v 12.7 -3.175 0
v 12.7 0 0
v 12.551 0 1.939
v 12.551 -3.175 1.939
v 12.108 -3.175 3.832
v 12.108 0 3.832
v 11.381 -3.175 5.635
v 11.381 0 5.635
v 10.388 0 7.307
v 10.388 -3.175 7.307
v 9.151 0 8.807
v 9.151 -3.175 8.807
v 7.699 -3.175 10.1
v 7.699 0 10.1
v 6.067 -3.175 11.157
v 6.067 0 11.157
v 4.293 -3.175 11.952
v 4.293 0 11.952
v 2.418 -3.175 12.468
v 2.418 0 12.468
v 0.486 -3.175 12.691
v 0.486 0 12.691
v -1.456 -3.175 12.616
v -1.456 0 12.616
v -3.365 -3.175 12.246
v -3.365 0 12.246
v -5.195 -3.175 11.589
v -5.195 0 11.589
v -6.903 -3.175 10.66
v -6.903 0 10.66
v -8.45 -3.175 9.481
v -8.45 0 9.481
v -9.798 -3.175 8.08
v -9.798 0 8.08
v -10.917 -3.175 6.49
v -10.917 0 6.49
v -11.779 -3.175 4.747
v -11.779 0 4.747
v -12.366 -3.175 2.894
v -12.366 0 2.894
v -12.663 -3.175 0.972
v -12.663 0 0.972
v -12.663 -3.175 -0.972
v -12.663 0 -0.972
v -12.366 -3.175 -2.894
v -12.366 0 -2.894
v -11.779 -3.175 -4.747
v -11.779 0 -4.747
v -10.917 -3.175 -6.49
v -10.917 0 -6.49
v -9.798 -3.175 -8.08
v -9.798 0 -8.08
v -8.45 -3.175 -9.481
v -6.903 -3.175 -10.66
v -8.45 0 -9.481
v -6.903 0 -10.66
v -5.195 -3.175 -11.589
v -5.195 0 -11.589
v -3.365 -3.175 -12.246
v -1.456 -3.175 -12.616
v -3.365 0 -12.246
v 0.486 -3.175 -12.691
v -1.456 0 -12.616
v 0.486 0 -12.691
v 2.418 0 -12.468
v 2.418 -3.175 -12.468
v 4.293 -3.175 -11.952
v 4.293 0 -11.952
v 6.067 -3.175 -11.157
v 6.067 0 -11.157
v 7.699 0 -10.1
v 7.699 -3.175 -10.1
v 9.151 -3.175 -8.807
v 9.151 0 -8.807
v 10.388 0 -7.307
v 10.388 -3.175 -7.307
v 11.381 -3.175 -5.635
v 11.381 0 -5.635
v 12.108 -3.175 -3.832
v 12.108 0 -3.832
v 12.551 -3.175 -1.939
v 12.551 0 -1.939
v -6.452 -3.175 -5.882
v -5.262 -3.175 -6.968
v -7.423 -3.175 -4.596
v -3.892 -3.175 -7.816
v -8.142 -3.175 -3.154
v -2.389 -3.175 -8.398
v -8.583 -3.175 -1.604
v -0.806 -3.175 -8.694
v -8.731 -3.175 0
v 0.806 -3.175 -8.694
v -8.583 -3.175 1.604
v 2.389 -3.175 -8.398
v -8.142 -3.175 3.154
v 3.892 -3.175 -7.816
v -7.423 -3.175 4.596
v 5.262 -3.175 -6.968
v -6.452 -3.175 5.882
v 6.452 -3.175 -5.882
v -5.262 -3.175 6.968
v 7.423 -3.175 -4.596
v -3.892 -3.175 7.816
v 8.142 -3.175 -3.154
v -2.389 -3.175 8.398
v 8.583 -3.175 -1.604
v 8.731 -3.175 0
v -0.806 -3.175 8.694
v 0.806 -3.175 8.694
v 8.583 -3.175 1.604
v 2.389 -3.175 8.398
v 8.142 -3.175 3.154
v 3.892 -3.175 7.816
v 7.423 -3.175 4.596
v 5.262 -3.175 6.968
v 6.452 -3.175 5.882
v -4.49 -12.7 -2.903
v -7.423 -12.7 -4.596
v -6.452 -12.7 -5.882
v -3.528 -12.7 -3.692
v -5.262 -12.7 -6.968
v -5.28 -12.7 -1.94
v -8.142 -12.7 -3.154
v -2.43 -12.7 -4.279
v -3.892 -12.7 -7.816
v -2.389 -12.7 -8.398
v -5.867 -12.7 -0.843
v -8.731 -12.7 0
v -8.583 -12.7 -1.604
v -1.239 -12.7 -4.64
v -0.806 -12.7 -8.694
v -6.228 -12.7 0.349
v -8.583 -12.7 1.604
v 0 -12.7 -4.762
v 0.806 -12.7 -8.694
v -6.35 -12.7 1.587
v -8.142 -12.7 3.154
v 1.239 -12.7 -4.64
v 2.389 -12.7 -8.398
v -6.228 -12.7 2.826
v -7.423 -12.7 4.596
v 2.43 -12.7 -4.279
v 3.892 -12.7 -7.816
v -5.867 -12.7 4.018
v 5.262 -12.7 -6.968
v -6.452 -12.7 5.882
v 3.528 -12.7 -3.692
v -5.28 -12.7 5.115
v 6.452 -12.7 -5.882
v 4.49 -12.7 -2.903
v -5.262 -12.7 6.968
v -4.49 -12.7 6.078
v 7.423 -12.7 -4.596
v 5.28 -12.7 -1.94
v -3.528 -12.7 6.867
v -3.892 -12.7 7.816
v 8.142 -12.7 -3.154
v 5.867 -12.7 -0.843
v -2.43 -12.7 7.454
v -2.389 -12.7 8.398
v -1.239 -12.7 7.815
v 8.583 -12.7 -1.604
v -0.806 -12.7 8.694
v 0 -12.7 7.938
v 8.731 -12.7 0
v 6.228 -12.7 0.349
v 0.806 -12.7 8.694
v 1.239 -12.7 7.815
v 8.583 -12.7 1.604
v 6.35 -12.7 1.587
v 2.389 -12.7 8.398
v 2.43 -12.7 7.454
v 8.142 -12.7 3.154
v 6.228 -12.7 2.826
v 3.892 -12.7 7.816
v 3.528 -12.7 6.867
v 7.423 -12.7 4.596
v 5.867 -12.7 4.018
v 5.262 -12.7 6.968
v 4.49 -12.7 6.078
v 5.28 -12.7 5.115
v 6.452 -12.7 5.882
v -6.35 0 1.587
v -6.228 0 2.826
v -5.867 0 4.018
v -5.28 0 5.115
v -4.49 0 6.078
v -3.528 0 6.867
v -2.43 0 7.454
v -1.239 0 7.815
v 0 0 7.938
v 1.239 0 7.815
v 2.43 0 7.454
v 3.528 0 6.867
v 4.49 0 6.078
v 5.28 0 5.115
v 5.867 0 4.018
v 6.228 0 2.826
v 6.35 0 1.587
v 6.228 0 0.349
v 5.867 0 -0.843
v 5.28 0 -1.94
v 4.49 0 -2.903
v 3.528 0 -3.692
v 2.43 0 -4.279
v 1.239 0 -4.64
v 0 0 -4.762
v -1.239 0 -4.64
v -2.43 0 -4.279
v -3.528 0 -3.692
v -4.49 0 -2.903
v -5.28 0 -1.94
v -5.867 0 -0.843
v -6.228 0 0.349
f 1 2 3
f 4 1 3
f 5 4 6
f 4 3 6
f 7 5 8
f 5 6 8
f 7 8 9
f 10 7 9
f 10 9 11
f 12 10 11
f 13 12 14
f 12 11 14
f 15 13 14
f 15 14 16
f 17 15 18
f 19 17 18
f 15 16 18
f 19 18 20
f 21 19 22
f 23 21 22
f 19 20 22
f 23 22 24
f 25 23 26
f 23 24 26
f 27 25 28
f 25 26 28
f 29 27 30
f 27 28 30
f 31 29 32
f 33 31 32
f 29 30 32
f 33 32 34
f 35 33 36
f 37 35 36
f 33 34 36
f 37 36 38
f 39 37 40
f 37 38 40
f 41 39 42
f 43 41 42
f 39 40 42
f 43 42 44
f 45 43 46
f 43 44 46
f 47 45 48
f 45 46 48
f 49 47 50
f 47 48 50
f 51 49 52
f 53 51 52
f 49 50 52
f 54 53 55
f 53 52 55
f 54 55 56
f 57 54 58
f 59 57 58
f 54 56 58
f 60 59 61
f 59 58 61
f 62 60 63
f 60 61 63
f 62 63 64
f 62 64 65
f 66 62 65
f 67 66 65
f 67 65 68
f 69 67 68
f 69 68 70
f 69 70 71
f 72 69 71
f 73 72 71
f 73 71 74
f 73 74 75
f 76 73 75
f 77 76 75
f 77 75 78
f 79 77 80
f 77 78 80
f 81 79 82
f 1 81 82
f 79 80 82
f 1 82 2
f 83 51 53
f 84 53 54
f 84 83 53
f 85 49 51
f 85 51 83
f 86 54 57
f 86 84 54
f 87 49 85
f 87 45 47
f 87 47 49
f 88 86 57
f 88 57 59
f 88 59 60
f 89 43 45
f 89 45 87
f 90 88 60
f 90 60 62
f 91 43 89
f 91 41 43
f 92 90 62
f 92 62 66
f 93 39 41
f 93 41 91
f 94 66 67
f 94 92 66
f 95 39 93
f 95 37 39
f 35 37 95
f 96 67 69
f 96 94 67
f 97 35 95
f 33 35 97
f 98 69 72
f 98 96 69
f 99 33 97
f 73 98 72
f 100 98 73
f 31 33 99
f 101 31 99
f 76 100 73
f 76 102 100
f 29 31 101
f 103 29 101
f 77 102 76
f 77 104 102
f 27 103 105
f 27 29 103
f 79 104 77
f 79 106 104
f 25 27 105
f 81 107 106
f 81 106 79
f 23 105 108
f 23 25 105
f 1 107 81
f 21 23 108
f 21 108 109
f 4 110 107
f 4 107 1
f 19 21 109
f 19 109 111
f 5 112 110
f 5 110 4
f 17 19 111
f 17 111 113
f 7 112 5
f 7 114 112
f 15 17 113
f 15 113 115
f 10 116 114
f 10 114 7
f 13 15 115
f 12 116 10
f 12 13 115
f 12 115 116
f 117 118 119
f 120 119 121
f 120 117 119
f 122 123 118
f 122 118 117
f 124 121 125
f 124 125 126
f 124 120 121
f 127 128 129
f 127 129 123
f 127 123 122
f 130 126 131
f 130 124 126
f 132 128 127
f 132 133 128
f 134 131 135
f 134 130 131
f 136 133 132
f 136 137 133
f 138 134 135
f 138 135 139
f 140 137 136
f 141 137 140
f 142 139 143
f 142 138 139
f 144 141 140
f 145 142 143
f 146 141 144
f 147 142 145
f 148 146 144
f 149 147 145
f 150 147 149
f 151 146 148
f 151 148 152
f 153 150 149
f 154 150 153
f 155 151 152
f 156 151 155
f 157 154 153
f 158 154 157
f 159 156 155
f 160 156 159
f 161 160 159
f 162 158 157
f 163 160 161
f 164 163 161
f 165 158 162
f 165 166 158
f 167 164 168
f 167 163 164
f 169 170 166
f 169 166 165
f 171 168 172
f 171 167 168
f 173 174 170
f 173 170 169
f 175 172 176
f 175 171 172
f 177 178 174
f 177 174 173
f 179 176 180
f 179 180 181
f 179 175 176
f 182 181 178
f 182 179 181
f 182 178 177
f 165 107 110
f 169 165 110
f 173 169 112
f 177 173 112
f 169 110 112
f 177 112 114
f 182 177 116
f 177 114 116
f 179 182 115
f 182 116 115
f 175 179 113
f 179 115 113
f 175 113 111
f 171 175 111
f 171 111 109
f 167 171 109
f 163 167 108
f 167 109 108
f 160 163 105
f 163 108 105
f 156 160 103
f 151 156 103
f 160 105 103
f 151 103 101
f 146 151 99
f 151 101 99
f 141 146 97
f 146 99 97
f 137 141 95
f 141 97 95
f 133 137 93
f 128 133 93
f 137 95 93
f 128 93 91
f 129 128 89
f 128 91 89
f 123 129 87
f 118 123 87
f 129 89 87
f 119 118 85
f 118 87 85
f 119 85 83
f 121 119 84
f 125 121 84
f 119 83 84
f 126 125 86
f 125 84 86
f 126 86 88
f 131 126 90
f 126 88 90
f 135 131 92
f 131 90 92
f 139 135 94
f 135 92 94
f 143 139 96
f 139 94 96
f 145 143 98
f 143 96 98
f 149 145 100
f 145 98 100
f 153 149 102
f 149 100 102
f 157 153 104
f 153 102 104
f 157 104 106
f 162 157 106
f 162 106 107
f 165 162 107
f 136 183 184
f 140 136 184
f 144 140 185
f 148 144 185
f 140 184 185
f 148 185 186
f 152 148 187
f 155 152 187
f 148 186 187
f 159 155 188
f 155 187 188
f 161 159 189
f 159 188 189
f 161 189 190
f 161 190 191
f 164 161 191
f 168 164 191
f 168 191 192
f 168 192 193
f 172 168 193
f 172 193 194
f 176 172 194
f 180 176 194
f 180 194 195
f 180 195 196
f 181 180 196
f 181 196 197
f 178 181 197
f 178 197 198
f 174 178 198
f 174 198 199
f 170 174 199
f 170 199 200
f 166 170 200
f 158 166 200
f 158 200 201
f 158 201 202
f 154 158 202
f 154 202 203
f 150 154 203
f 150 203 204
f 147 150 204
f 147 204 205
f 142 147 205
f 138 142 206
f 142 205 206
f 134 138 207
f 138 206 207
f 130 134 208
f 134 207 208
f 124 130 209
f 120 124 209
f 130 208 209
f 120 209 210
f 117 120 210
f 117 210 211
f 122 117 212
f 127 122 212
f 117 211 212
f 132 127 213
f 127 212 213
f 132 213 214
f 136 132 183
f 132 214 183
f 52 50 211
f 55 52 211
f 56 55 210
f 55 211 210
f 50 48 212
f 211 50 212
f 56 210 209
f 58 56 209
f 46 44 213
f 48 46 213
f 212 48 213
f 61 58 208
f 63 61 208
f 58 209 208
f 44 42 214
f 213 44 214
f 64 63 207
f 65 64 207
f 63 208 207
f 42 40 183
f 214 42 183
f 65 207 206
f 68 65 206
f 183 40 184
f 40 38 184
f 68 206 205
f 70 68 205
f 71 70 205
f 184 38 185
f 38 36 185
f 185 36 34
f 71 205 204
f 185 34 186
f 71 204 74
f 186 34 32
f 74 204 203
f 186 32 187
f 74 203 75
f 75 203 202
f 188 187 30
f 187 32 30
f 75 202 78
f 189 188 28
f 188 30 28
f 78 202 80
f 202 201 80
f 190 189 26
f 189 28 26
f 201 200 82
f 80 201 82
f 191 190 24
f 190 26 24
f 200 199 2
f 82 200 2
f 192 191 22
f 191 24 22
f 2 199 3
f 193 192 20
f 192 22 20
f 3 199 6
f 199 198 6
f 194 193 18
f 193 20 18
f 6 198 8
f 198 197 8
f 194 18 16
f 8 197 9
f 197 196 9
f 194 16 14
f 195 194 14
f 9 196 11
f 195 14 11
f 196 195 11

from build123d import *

# Parameters (mm, degrees)
F0_R     = 12.7
F0_R_2   = 8.73125
F1_DEPTH = 3.175
F2_R     = 8.73125
F3_DEPTH = 9.525
F5_D     = 12.7


with BuildPart() as f1:
    # F0 (on Front) → F1 (new body)
    with BuildSketch(Plane.XZ):
        Circle(F0_R)
        Circle(F0_R_2, mode=Mode.SUBTRACT)
        Circle(F0_R_2)
    extrude(amount=F1_DEPTH)

    # F2 (on face) → F3 (join)
    with BuildSketch(Plane.XZ.offset(3.175)):
        Circle(F2_R)
    extrude(amount=F3_DEPTH)

    # F5 (through all)
    with Locations(Plane.XZ.offset(12.7)):
        with Locations((0, 1.5875)):
            Hole(F5_D / 2)


solid = f1.part
